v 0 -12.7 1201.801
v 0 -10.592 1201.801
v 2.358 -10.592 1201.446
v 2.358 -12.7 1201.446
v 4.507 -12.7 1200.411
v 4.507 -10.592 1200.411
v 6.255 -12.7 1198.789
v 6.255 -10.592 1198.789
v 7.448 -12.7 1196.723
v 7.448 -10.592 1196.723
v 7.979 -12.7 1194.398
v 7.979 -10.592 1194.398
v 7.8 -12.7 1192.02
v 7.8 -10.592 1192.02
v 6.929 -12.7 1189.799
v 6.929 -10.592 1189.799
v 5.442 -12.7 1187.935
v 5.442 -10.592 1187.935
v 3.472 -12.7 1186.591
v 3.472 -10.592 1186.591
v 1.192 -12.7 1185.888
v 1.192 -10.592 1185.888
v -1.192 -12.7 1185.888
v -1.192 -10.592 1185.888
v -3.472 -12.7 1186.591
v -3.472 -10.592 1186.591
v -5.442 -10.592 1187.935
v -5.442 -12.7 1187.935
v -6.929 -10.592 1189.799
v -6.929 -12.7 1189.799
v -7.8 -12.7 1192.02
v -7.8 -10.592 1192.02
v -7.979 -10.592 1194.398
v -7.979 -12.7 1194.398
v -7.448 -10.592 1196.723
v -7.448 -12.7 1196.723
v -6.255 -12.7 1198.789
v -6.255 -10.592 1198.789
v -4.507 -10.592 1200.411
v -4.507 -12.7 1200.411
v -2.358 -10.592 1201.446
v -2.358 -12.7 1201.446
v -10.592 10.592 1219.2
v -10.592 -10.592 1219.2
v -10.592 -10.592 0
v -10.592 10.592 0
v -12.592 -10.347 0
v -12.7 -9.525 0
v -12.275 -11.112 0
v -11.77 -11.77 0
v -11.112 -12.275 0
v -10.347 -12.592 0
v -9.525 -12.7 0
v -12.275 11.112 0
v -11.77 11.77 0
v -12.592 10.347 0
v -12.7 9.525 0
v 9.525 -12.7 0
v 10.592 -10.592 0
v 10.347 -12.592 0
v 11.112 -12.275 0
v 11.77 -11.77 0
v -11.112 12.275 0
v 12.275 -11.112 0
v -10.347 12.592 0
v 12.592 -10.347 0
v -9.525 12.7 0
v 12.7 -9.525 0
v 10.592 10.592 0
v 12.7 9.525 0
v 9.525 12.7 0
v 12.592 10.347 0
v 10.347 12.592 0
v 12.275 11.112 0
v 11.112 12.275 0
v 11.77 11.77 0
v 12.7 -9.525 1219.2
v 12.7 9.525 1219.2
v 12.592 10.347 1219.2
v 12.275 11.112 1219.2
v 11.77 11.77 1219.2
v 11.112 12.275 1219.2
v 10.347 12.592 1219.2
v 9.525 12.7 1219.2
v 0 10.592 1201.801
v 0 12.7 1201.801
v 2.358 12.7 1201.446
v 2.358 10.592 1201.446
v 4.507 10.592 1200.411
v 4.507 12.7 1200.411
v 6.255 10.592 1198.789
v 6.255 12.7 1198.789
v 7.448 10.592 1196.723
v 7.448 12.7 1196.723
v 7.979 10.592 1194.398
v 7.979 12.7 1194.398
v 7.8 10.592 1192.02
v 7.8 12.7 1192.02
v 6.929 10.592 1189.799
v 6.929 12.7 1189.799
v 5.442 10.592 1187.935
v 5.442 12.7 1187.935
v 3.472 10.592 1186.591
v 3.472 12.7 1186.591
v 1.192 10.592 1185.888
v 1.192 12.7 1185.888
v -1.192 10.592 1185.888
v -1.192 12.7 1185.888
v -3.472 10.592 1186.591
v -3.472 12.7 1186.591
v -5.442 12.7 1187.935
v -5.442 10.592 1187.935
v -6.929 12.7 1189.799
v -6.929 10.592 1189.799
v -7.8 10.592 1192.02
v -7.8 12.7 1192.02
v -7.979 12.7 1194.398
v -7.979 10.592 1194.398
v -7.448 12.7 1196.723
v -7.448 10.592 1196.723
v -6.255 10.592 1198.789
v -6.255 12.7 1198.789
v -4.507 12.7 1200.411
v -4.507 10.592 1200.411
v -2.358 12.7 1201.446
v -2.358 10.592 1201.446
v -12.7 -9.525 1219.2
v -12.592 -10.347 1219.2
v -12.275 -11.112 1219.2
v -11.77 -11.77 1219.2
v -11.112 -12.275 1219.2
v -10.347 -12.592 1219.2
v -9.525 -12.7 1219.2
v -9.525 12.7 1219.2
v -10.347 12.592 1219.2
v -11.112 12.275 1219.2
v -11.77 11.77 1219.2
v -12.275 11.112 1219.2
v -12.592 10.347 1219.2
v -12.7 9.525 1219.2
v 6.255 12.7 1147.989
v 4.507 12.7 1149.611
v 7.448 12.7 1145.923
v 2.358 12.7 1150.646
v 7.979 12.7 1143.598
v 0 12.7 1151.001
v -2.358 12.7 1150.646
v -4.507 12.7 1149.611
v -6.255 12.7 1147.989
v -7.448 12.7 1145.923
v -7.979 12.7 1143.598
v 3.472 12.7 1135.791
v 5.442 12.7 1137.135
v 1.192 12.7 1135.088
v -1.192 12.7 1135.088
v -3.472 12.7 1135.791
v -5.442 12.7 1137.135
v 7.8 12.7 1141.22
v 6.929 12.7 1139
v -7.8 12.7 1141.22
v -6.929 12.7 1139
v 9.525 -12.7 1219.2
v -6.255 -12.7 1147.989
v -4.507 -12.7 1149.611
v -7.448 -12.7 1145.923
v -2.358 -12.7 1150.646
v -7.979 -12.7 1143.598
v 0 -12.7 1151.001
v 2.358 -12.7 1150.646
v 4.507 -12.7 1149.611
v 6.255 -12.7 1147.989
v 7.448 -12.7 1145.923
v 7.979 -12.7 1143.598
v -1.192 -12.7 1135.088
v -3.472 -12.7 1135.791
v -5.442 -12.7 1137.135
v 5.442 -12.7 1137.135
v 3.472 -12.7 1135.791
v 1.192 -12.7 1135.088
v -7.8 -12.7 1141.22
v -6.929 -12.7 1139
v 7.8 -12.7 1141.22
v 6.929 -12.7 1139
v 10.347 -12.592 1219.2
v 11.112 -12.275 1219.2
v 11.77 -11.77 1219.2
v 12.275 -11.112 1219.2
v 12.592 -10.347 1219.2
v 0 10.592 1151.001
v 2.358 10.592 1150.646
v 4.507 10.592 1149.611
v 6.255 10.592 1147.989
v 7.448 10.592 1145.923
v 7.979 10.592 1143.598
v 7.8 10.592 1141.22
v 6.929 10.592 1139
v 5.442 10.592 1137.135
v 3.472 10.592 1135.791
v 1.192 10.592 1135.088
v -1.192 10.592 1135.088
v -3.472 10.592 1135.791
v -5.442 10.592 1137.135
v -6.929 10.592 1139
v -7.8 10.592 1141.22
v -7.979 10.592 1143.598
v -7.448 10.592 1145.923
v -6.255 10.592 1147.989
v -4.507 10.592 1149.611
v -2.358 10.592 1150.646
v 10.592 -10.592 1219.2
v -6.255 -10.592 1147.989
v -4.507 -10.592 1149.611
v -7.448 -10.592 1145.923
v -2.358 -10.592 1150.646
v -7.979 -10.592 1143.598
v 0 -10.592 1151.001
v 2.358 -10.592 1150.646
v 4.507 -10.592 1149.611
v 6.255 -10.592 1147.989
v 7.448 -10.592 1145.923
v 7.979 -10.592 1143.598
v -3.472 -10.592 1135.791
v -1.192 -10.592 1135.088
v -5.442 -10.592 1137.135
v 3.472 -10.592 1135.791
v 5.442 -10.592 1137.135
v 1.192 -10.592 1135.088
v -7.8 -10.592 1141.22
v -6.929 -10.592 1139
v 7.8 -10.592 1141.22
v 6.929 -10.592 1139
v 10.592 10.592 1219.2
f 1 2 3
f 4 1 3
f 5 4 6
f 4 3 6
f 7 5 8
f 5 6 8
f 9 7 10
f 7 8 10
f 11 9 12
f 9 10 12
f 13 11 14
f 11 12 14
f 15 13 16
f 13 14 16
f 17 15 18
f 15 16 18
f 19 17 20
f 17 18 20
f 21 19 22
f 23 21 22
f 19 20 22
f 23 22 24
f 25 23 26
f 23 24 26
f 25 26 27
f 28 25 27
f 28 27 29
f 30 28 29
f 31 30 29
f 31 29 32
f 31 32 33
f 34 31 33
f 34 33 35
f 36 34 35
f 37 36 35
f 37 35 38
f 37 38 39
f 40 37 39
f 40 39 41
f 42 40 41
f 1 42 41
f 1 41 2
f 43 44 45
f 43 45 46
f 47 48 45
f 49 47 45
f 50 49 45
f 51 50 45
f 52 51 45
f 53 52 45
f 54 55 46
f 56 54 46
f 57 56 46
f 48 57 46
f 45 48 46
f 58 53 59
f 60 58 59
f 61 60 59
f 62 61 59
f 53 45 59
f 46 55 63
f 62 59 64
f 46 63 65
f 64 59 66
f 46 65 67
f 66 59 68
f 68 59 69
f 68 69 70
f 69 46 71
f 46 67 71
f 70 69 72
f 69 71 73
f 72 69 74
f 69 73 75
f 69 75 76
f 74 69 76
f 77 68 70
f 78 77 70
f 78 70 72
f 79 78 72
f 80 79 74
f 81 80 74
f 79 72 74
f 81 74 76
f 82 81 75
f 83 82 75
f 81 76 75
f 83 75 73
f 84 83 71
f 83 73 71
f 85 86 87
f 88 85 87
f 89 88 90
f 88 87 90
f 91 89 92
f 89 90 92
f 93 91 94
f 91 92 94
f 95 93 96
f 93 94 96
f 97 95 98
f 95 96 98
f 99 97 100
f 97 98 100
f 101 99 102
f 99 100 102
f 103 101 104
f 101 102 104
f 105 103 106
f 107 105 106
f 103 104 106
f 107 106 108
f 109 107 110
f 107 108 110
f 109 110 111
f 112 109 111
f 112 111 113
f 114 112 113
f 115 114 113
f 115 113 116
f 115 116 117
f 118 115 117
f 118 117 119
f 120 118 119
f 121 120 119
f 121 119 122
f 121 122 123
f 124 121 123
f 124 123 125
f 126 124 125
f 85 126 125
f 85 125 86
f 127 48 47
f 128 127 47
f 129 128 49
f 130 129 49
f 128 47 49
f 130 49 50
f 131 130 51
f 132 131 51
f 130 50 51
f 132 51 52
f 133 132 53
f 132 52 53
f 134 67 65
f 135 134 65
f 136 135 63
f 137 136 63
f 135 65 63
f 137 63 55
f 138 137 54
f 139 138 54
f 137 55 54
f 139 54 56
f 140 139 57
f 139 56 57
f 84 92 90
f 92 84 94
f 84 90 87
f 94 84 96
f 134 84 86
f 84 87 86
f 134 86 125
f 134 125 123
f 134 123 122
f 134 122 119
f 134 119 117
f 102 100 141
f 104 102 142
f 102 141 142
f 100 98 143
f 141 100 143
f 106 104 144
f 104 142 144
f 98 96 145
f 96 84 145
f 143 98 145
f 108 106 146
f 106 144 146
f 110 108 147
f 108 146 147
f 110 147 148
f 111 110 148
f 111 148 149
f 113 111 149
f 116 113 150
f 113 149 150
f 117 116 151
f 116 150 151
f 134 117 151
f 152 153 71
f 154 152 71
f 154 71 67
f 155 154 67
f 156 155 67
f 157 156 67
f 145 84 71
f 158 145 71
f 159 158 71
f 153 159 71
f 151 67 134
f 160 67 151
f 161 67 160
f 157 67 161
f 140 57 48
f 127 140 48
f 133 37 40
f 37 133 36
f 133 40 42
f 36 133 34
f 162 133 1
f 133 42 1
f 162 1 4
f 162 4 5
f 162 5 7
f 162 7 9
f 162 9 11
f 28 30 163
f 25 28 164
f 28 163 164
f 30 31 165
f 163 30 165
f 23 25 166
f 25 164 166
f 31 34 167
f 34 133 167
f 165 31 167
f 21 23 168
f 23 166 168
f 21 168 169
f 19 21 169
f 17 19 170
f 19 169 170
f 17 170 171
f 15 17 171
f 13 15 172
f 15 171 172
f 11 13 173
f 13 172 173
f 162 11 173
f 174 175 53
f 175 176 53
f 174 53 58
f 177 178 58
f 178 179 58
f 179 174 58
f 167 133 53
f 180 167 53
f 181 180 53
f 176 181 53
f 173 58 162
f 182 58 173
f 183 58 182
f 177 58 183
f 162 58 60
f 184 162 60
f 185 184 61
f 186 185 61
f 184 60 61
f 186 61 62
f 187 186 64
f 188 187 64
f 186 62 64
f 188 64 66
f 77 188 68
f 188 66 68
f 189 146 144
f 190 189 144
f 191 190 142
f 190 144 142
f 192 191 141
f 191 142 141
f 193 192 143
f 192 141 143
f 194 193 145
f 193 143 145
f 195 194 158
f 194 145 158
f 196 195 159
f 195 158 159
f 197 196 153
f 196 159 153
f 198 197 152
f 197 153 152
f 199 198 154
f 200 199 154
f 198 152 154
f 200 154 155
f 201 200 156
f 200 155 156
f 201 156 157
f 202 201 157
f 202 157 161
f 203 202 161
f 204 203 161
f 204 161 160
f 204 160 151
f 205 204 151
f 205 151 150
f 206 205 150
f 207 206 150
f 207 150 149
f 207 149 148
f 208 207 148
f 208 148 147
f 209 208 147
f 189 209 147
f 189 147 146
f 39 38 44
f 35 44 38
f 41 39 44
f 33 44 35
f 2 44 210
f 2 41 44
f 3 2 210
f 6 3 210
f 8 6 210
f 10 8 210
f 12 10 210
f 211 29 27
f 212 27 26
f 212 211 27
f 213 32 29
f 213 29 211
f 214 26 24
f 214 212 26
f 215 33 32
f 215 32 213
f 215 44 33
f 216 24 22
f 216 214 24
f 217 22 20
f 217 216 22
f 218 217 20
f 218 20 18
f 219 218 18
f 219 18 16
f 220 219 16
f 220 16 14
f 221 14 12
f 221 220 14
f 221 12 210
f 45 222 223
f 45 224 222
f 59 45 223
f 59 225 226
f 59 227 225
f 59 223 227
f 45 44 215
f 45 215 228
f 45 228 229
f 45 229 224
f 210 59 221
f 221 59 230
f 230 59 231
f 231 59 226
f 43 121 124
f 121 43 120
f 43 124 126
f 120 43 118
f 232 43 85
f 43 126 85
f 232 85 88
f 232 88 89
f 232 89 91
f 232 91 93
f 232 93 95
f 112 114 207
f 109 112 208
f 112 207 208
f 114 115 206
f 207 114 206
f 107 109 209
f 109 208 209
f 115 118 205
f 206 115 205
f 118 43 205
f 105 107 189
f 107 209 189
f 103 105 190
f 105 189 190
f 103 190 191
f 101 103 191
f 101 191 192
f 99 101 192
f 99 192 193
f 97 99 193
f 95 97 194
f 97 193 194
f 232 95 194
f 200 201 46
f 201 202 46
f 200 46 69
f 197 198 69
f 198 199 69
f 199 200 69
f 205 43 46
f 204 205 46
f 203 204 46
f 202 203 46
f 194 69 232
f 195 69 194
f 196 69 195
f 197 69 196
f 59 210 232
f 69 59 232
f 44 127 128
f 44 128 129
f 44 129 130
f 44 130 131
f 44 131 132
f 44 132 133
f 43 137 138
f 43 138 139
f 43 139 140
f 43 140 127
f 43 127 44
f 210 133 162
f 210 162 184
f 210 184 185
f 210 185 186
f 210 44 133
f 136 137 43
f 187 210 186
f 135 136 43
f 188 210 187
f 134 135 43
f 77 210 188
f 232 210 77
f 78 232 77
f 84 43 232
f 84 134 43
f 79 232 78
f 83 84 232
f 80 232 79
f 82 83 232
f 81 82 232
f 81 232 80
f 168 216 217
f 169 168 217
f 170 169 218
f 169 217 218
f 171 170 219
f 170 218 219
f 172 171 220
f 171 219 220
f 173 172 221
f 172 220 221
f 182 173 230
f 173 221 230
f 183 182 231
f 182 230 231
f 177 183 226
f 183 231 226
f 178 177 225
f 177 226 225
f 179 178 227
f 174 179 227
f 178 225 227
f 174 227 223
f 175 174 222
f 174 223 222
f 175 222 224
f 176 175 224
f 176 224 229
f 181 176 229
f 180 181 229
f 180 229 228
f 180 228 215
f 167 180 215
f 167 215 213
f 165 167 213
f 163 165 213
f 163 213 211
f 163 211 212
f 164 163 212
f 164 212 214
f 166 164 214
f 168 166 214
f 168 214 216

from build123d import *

# Parameters (mm, degrees)
SKETCH1_W           = 21.1836
SKETCH1_H           = 21.1836
BOSS_EXTRUDE1_DEPTH = 1219.2
SKETCH2_R           = 8.001
CUT_EXTRUDE1_DEPTH  = 1219.2


with BuildPart() as part:
    # Sketch1 → Boss-Extrude1 (new body)
    with BuildSketch(Plane.XY):
        with BuildLine():
            Line((-9.525, -12.7), (9.525, -12.7))
            ThreePointArc((9.525, -12.7), (11.77006403, -11.77006403), (12.7, -9.525))
            Line((12.7, -9.525), (12.7, 9.525))
            ThreePointArc((12.7, 9.525), (11.77006403, 11.77006403), (9.525, 12.7))
            Line((9.525, 12.7), (-9.525, 12.7))
            ThreePointArc((-9.525, 12.7), (-11.77006403, 11.77006403), (-12.7, 9.525))
            Line((-12.7, 9.525), (-12.7, -9.525))
            ThreePointArc((-12.7, -9.525), (-11.77006403, -11.77006403), (-9.525, -12.7))
        make_face()
        Rectangle(SKETCH1_W, SKETCH1_H, mode=Mode.SUBTRACT)
    extrude(amount=BOSS_EXTRUDE1_DEPTH)

    # Sketch2 → Cut-Extrude1 (cut)
    with BuildSketch(Plane(origin=(0, 12.7, 0), x_dir=(1, 0, 0), z_dir=(0, 1, 0))):
        with Locations(Location((0, -1193.8, 0), (0, 0, 270))):
            Circle(SKETCH2_R)
        with Locations(Location((0, -1143, 0), (0, 0, 270))):
            Circle(SKETCH2_R)
    extrude(amount=-CUT_EXTRUDE1_DEPTH, mode=Mode.SUBTRACT)


solid = part.part
